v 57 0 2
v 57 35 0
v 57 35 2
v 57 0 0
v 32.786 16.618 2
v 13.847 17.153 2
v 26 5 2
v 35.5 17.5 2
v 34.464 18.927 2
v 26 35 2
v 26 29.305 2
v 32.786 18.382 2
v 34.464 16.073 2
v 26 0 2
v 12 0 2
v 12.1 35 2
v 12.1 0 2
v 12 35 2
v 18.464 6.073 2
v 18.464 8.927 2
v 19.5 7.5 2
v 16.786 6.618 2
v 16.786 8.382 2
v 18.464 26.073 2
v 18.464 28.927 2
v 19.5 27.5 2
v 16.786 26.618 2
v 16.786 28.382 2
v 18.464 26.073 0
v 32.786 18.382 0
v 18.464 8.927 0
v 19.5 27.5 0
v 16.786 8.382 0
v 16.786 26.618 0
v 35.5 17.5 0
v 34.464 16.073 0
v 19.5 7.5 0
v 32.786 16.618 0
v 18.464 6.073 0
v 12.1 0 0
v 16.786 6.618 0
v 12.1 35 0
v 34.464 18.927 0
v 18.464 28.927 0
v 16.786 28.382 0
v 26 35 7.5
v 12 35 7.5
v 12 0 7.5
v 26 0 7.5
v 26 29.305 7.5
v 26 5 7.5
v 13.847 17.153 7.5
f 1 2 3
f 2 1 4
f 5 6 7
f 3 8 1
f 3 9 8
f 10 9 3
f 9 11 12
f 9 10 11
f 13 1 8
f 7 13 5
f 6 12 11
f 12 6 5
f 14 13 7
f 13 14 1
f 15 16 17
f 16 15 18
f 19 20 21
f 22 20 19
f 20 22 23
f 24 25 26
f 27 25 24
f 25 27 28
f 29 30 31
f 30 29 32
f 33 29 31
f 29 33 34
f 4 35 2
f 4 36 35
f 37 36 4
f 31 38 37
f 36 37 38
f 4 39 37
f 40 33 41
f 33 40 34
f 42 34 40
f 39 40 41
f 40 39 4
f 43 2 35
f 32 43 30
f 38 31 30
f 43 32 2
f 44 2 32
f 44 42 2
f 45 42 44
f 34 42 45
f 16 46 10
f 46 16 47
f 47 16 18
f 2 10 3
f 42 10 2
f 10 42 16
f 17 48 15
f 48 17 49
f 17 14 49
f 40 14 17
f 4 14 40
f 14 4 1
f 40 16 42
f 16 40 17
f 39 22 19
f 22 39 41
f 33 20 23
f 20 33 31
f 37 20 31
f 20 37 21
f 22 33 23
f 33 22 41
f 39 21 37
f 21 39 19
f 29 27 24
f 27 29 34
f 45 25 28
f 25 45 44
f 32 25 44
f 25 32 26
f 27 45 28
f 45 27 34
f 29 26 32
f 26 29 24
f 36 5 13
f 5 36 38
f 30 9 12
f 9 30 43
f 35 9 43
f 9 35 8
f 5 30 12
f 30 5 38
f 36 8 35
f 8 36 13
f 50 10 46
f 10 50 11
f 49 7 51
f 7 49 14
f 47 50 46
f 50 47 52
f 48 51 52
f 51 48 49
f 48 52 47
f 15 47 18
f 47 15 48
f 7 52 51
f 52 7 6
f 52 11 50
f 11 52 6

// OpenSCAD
module cam(){
    x = 43+14;
    y = 35;
    z = 2;
    union(){
        difference(){
            
               cube([x,y,z]);
            // cut a bit on both sides of material off 
            translate([-0.5,-0.1,-0.1]) cube([3.6+9,y+0.2,30]);
            translate([x+13.5,-0.1,-0.1]) cube([6.1,y+0.2,30]);
            
            
            // make some holes to accept a piece that can be glued on the bottom
            translate([18,y/2-10,0]) cylinder(r=1.5, h=3);
            translate([18,y/2+10,0]) cylinder(r=1.5, h=3);
            translate([34,y/2,0]) cylinder(r=1.5, h=3);
            
        }
        translate([12,0,z]) {
            difference(){
                cube([14,y,5.5]);
                #translate([22,-3,0]) rotate([0,0,45]) cube([x/2,x/2,5.5]);
            }

        }
    }
}
cam();
